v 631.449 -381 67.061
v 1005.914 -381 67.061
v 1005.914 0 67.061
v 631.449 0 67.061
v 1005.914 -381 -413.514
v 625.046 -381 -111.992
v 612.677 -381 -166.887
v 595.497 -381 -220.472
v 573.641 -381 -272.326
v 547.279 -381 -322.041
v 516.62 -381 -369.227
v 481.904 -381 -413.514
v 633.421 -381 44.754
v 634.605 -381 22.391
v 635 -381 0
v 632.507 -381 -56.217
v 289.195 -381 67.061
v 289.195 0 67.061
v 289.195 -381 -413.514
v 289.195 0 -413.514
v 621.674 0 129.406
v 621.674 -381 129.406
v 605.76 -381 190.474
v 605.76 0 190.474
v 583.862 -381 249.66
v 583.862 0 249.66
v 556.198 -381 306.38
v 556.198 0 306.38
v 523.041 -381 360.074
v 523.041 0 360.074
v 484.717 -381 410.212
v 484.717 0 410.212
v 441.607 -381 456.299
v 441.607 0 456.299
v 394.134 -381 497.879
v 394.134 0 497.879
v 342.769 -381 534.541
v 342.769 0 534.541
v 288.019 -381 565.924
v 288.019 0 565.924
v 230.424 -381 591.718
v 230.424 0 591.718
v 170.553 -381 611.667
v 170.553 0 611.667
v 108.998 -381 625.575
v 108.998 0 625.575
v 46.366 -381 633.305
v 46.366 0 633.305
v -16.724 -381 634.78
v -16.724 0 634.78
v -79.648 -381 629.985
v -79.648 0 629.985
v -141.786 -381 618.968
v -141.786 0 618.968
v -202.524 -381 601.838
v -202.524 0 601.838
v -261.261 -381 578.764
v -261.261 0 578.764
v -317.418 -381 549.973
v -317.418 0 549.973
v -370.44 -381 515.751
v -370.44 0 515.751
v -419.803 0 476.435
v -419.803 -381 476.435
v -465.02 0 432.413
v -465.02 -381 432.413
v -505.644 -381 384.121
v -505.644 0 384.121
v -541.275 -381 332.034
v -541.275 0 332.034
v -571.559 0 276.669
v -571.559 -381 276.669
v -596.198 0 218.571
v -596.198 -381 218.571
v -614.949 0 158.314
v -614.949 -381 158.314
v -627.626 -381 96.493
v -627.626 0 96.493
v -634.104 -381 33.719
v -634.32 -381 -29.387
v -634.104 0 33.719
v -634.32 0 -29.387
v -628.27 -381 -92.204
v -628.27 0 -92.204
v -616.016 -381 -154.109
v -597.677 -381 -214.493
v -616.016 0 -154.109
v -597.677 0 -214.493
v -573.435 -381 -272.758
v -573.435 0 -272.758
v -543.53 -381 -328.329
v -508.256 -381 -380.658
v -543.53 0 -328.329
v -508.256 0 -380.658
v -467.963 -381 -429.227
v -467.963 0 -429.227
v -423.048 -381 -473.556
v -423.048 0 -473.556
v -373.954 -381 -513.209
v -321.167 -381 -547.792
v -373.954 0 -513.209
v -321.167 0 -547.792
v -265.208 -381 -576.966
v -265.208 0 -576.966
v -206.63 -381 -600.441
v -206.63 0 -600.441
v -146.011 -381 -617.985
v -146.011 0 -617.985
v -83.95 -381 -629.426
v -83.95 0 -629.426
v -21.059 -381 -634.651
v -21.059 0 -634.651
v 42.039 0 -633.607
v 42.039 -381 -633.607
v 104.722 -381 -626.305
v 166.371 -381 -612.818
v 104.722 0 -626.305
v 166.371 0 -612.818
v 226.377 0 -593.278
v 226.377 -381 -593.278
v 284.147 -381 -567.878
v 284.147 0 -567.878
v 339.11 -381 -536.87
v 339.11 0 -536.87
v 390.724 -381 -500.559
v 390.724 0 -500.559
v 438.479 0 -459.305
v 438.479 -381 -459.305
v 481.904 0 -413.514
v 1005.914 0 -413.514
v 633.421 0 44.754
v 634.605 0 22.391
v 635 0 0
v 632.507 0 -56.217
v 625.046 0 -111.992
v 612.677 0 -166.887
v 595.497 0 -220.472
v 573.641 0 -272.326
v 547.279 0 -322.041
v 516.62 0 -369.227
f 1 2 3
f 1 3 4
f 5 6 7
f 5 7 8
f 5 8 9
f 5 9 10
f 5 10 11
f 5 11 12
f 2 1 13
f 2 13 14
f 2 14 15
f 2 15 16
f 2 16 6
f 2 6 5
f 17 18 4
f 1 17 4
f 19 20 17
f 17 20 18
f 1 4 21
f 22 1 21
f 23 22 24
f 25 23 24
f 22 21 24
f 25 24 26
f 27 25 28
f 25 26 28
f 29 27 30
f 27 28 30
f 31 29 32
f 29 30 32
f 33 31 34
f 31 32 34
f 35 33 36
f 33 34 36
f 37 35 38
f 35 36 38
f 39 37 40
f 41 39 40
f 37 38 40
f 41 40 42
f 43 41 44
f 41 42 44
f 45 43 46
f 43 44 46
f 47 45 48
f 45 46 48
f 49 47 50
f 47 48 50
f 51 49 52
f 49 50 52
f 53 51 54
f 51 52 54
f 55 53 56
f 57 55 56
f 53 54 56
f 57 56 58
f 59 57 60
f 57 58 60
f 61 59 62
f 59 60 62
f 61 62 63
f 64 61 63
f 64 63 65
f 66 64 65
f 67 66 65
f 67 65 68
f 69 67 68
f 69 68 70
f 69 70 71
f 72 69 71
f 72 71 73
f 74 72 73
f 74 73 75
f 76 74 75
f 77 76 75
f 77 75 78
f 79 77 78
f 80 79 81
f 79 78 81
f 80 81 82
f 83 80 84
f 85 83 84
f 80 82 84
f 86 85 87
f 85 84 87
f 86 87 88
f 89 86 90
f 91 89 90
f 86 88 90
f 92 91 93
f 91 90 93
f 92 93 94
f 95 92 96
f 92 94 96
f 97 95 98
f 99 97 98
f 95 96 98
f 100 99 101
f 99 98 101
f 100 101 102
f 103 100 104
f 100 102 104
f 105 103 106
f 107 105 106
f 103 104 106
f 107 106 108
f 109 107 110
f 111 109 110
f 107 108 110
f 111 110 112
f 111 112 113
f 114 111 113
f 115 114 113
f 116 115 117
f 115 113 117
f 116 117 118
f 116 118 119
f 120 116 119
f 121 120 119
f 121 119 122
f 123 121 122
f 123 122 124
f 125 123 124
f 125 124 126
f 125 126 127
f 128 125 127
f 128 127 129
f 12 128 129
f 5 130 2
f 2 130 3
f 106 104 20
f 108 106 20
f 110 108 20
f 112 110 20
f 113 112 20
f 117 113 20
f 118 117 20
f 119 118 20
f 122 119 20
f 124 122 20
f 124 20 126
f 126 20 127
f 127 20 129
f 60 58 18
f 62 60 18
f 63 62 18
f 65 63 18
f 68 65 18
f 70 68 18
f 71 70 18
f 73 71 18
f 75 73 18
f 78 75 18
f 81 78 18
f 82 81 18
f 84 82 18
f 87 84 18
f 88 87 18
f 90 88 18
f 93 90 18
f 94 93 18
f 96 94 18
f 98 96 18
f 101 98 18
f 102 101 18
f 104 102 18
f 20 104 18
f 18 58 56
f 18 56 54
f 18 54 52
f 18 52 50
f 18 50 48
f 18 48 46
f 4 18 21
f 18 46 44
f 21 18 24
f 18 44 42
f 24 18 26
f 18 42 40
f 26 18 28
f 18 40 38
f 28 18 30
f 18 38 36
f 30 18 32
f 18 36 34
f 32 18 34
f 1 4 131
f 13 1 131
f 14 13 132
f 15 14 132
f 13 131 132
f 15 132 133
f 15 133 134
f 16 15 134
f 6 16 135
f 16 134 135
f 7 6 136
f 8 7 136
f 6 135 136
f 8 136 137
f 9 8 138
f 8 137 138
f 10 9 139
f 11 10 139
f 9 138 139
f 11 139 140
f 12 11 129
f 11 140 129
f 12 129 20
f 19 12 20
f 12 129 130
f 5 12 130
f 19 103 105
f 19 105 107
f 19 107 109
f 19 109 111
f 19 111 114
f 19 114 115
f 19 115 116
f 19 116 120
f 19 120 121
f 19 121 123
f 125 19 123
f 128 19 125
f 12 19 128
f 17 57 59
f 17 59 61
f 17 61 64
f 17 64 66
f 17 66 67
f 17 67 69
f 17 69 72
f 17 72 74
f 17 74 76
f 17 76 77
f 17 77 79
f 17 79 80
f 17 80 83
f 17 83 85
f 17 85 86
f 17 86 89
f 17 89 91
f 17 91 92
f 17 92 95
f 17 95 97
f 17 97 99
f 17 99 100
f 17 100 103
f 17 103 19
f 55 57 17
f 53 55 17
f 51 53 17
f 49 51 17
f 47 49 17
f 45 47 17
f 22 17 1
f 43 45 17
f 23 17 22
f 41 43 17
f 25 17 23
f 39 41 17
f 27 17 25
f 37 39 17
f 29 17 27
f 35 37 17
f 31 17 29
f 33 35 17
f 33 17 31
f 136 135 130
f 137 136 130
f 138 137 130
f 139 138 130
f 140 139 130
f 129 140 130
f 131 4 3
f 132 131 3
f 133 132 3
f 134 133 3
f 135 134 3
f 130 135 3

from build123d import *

# Parameters (mm, degrees)
F1_DEPTH = 381


with BuildPart() as f1:
    # F0 (on Front) → F1 (new body)
    with BuildSketch(Plane.XZ):
        with BuildLine():
            Line((289.194763, 67.061059), (631.44898, 67.061059))
            ThreePointArc((631.44898, 67.061059), (-606.322281, 188.675095), (481.903936, -413.51372))
            Line((481.903936, -413.51372), (289.194763, -413.51372))
            Line((289.194763, -413.51372), (289.194763, 67.061059))
        make_face()
        with BuildLine():
            ThreePointArc((631.44898, 67.061059), (634.111624, 33.577505), (635, 0))
            ThreePointArc((635, 0), (595.497271, -220.472221), (481.903936, -413.51372))
            Line((481.903936, -413.51372), (1005.913973, -413.51372))
            Line((1005.913973, -413.51372), (1005.913973, 67.061059))
            Line((1005.913973, 67.061059), (631.44898, 67.061059))
        make_face()
    extrude(amount=F1_DEPTH)


solid = f1.part
